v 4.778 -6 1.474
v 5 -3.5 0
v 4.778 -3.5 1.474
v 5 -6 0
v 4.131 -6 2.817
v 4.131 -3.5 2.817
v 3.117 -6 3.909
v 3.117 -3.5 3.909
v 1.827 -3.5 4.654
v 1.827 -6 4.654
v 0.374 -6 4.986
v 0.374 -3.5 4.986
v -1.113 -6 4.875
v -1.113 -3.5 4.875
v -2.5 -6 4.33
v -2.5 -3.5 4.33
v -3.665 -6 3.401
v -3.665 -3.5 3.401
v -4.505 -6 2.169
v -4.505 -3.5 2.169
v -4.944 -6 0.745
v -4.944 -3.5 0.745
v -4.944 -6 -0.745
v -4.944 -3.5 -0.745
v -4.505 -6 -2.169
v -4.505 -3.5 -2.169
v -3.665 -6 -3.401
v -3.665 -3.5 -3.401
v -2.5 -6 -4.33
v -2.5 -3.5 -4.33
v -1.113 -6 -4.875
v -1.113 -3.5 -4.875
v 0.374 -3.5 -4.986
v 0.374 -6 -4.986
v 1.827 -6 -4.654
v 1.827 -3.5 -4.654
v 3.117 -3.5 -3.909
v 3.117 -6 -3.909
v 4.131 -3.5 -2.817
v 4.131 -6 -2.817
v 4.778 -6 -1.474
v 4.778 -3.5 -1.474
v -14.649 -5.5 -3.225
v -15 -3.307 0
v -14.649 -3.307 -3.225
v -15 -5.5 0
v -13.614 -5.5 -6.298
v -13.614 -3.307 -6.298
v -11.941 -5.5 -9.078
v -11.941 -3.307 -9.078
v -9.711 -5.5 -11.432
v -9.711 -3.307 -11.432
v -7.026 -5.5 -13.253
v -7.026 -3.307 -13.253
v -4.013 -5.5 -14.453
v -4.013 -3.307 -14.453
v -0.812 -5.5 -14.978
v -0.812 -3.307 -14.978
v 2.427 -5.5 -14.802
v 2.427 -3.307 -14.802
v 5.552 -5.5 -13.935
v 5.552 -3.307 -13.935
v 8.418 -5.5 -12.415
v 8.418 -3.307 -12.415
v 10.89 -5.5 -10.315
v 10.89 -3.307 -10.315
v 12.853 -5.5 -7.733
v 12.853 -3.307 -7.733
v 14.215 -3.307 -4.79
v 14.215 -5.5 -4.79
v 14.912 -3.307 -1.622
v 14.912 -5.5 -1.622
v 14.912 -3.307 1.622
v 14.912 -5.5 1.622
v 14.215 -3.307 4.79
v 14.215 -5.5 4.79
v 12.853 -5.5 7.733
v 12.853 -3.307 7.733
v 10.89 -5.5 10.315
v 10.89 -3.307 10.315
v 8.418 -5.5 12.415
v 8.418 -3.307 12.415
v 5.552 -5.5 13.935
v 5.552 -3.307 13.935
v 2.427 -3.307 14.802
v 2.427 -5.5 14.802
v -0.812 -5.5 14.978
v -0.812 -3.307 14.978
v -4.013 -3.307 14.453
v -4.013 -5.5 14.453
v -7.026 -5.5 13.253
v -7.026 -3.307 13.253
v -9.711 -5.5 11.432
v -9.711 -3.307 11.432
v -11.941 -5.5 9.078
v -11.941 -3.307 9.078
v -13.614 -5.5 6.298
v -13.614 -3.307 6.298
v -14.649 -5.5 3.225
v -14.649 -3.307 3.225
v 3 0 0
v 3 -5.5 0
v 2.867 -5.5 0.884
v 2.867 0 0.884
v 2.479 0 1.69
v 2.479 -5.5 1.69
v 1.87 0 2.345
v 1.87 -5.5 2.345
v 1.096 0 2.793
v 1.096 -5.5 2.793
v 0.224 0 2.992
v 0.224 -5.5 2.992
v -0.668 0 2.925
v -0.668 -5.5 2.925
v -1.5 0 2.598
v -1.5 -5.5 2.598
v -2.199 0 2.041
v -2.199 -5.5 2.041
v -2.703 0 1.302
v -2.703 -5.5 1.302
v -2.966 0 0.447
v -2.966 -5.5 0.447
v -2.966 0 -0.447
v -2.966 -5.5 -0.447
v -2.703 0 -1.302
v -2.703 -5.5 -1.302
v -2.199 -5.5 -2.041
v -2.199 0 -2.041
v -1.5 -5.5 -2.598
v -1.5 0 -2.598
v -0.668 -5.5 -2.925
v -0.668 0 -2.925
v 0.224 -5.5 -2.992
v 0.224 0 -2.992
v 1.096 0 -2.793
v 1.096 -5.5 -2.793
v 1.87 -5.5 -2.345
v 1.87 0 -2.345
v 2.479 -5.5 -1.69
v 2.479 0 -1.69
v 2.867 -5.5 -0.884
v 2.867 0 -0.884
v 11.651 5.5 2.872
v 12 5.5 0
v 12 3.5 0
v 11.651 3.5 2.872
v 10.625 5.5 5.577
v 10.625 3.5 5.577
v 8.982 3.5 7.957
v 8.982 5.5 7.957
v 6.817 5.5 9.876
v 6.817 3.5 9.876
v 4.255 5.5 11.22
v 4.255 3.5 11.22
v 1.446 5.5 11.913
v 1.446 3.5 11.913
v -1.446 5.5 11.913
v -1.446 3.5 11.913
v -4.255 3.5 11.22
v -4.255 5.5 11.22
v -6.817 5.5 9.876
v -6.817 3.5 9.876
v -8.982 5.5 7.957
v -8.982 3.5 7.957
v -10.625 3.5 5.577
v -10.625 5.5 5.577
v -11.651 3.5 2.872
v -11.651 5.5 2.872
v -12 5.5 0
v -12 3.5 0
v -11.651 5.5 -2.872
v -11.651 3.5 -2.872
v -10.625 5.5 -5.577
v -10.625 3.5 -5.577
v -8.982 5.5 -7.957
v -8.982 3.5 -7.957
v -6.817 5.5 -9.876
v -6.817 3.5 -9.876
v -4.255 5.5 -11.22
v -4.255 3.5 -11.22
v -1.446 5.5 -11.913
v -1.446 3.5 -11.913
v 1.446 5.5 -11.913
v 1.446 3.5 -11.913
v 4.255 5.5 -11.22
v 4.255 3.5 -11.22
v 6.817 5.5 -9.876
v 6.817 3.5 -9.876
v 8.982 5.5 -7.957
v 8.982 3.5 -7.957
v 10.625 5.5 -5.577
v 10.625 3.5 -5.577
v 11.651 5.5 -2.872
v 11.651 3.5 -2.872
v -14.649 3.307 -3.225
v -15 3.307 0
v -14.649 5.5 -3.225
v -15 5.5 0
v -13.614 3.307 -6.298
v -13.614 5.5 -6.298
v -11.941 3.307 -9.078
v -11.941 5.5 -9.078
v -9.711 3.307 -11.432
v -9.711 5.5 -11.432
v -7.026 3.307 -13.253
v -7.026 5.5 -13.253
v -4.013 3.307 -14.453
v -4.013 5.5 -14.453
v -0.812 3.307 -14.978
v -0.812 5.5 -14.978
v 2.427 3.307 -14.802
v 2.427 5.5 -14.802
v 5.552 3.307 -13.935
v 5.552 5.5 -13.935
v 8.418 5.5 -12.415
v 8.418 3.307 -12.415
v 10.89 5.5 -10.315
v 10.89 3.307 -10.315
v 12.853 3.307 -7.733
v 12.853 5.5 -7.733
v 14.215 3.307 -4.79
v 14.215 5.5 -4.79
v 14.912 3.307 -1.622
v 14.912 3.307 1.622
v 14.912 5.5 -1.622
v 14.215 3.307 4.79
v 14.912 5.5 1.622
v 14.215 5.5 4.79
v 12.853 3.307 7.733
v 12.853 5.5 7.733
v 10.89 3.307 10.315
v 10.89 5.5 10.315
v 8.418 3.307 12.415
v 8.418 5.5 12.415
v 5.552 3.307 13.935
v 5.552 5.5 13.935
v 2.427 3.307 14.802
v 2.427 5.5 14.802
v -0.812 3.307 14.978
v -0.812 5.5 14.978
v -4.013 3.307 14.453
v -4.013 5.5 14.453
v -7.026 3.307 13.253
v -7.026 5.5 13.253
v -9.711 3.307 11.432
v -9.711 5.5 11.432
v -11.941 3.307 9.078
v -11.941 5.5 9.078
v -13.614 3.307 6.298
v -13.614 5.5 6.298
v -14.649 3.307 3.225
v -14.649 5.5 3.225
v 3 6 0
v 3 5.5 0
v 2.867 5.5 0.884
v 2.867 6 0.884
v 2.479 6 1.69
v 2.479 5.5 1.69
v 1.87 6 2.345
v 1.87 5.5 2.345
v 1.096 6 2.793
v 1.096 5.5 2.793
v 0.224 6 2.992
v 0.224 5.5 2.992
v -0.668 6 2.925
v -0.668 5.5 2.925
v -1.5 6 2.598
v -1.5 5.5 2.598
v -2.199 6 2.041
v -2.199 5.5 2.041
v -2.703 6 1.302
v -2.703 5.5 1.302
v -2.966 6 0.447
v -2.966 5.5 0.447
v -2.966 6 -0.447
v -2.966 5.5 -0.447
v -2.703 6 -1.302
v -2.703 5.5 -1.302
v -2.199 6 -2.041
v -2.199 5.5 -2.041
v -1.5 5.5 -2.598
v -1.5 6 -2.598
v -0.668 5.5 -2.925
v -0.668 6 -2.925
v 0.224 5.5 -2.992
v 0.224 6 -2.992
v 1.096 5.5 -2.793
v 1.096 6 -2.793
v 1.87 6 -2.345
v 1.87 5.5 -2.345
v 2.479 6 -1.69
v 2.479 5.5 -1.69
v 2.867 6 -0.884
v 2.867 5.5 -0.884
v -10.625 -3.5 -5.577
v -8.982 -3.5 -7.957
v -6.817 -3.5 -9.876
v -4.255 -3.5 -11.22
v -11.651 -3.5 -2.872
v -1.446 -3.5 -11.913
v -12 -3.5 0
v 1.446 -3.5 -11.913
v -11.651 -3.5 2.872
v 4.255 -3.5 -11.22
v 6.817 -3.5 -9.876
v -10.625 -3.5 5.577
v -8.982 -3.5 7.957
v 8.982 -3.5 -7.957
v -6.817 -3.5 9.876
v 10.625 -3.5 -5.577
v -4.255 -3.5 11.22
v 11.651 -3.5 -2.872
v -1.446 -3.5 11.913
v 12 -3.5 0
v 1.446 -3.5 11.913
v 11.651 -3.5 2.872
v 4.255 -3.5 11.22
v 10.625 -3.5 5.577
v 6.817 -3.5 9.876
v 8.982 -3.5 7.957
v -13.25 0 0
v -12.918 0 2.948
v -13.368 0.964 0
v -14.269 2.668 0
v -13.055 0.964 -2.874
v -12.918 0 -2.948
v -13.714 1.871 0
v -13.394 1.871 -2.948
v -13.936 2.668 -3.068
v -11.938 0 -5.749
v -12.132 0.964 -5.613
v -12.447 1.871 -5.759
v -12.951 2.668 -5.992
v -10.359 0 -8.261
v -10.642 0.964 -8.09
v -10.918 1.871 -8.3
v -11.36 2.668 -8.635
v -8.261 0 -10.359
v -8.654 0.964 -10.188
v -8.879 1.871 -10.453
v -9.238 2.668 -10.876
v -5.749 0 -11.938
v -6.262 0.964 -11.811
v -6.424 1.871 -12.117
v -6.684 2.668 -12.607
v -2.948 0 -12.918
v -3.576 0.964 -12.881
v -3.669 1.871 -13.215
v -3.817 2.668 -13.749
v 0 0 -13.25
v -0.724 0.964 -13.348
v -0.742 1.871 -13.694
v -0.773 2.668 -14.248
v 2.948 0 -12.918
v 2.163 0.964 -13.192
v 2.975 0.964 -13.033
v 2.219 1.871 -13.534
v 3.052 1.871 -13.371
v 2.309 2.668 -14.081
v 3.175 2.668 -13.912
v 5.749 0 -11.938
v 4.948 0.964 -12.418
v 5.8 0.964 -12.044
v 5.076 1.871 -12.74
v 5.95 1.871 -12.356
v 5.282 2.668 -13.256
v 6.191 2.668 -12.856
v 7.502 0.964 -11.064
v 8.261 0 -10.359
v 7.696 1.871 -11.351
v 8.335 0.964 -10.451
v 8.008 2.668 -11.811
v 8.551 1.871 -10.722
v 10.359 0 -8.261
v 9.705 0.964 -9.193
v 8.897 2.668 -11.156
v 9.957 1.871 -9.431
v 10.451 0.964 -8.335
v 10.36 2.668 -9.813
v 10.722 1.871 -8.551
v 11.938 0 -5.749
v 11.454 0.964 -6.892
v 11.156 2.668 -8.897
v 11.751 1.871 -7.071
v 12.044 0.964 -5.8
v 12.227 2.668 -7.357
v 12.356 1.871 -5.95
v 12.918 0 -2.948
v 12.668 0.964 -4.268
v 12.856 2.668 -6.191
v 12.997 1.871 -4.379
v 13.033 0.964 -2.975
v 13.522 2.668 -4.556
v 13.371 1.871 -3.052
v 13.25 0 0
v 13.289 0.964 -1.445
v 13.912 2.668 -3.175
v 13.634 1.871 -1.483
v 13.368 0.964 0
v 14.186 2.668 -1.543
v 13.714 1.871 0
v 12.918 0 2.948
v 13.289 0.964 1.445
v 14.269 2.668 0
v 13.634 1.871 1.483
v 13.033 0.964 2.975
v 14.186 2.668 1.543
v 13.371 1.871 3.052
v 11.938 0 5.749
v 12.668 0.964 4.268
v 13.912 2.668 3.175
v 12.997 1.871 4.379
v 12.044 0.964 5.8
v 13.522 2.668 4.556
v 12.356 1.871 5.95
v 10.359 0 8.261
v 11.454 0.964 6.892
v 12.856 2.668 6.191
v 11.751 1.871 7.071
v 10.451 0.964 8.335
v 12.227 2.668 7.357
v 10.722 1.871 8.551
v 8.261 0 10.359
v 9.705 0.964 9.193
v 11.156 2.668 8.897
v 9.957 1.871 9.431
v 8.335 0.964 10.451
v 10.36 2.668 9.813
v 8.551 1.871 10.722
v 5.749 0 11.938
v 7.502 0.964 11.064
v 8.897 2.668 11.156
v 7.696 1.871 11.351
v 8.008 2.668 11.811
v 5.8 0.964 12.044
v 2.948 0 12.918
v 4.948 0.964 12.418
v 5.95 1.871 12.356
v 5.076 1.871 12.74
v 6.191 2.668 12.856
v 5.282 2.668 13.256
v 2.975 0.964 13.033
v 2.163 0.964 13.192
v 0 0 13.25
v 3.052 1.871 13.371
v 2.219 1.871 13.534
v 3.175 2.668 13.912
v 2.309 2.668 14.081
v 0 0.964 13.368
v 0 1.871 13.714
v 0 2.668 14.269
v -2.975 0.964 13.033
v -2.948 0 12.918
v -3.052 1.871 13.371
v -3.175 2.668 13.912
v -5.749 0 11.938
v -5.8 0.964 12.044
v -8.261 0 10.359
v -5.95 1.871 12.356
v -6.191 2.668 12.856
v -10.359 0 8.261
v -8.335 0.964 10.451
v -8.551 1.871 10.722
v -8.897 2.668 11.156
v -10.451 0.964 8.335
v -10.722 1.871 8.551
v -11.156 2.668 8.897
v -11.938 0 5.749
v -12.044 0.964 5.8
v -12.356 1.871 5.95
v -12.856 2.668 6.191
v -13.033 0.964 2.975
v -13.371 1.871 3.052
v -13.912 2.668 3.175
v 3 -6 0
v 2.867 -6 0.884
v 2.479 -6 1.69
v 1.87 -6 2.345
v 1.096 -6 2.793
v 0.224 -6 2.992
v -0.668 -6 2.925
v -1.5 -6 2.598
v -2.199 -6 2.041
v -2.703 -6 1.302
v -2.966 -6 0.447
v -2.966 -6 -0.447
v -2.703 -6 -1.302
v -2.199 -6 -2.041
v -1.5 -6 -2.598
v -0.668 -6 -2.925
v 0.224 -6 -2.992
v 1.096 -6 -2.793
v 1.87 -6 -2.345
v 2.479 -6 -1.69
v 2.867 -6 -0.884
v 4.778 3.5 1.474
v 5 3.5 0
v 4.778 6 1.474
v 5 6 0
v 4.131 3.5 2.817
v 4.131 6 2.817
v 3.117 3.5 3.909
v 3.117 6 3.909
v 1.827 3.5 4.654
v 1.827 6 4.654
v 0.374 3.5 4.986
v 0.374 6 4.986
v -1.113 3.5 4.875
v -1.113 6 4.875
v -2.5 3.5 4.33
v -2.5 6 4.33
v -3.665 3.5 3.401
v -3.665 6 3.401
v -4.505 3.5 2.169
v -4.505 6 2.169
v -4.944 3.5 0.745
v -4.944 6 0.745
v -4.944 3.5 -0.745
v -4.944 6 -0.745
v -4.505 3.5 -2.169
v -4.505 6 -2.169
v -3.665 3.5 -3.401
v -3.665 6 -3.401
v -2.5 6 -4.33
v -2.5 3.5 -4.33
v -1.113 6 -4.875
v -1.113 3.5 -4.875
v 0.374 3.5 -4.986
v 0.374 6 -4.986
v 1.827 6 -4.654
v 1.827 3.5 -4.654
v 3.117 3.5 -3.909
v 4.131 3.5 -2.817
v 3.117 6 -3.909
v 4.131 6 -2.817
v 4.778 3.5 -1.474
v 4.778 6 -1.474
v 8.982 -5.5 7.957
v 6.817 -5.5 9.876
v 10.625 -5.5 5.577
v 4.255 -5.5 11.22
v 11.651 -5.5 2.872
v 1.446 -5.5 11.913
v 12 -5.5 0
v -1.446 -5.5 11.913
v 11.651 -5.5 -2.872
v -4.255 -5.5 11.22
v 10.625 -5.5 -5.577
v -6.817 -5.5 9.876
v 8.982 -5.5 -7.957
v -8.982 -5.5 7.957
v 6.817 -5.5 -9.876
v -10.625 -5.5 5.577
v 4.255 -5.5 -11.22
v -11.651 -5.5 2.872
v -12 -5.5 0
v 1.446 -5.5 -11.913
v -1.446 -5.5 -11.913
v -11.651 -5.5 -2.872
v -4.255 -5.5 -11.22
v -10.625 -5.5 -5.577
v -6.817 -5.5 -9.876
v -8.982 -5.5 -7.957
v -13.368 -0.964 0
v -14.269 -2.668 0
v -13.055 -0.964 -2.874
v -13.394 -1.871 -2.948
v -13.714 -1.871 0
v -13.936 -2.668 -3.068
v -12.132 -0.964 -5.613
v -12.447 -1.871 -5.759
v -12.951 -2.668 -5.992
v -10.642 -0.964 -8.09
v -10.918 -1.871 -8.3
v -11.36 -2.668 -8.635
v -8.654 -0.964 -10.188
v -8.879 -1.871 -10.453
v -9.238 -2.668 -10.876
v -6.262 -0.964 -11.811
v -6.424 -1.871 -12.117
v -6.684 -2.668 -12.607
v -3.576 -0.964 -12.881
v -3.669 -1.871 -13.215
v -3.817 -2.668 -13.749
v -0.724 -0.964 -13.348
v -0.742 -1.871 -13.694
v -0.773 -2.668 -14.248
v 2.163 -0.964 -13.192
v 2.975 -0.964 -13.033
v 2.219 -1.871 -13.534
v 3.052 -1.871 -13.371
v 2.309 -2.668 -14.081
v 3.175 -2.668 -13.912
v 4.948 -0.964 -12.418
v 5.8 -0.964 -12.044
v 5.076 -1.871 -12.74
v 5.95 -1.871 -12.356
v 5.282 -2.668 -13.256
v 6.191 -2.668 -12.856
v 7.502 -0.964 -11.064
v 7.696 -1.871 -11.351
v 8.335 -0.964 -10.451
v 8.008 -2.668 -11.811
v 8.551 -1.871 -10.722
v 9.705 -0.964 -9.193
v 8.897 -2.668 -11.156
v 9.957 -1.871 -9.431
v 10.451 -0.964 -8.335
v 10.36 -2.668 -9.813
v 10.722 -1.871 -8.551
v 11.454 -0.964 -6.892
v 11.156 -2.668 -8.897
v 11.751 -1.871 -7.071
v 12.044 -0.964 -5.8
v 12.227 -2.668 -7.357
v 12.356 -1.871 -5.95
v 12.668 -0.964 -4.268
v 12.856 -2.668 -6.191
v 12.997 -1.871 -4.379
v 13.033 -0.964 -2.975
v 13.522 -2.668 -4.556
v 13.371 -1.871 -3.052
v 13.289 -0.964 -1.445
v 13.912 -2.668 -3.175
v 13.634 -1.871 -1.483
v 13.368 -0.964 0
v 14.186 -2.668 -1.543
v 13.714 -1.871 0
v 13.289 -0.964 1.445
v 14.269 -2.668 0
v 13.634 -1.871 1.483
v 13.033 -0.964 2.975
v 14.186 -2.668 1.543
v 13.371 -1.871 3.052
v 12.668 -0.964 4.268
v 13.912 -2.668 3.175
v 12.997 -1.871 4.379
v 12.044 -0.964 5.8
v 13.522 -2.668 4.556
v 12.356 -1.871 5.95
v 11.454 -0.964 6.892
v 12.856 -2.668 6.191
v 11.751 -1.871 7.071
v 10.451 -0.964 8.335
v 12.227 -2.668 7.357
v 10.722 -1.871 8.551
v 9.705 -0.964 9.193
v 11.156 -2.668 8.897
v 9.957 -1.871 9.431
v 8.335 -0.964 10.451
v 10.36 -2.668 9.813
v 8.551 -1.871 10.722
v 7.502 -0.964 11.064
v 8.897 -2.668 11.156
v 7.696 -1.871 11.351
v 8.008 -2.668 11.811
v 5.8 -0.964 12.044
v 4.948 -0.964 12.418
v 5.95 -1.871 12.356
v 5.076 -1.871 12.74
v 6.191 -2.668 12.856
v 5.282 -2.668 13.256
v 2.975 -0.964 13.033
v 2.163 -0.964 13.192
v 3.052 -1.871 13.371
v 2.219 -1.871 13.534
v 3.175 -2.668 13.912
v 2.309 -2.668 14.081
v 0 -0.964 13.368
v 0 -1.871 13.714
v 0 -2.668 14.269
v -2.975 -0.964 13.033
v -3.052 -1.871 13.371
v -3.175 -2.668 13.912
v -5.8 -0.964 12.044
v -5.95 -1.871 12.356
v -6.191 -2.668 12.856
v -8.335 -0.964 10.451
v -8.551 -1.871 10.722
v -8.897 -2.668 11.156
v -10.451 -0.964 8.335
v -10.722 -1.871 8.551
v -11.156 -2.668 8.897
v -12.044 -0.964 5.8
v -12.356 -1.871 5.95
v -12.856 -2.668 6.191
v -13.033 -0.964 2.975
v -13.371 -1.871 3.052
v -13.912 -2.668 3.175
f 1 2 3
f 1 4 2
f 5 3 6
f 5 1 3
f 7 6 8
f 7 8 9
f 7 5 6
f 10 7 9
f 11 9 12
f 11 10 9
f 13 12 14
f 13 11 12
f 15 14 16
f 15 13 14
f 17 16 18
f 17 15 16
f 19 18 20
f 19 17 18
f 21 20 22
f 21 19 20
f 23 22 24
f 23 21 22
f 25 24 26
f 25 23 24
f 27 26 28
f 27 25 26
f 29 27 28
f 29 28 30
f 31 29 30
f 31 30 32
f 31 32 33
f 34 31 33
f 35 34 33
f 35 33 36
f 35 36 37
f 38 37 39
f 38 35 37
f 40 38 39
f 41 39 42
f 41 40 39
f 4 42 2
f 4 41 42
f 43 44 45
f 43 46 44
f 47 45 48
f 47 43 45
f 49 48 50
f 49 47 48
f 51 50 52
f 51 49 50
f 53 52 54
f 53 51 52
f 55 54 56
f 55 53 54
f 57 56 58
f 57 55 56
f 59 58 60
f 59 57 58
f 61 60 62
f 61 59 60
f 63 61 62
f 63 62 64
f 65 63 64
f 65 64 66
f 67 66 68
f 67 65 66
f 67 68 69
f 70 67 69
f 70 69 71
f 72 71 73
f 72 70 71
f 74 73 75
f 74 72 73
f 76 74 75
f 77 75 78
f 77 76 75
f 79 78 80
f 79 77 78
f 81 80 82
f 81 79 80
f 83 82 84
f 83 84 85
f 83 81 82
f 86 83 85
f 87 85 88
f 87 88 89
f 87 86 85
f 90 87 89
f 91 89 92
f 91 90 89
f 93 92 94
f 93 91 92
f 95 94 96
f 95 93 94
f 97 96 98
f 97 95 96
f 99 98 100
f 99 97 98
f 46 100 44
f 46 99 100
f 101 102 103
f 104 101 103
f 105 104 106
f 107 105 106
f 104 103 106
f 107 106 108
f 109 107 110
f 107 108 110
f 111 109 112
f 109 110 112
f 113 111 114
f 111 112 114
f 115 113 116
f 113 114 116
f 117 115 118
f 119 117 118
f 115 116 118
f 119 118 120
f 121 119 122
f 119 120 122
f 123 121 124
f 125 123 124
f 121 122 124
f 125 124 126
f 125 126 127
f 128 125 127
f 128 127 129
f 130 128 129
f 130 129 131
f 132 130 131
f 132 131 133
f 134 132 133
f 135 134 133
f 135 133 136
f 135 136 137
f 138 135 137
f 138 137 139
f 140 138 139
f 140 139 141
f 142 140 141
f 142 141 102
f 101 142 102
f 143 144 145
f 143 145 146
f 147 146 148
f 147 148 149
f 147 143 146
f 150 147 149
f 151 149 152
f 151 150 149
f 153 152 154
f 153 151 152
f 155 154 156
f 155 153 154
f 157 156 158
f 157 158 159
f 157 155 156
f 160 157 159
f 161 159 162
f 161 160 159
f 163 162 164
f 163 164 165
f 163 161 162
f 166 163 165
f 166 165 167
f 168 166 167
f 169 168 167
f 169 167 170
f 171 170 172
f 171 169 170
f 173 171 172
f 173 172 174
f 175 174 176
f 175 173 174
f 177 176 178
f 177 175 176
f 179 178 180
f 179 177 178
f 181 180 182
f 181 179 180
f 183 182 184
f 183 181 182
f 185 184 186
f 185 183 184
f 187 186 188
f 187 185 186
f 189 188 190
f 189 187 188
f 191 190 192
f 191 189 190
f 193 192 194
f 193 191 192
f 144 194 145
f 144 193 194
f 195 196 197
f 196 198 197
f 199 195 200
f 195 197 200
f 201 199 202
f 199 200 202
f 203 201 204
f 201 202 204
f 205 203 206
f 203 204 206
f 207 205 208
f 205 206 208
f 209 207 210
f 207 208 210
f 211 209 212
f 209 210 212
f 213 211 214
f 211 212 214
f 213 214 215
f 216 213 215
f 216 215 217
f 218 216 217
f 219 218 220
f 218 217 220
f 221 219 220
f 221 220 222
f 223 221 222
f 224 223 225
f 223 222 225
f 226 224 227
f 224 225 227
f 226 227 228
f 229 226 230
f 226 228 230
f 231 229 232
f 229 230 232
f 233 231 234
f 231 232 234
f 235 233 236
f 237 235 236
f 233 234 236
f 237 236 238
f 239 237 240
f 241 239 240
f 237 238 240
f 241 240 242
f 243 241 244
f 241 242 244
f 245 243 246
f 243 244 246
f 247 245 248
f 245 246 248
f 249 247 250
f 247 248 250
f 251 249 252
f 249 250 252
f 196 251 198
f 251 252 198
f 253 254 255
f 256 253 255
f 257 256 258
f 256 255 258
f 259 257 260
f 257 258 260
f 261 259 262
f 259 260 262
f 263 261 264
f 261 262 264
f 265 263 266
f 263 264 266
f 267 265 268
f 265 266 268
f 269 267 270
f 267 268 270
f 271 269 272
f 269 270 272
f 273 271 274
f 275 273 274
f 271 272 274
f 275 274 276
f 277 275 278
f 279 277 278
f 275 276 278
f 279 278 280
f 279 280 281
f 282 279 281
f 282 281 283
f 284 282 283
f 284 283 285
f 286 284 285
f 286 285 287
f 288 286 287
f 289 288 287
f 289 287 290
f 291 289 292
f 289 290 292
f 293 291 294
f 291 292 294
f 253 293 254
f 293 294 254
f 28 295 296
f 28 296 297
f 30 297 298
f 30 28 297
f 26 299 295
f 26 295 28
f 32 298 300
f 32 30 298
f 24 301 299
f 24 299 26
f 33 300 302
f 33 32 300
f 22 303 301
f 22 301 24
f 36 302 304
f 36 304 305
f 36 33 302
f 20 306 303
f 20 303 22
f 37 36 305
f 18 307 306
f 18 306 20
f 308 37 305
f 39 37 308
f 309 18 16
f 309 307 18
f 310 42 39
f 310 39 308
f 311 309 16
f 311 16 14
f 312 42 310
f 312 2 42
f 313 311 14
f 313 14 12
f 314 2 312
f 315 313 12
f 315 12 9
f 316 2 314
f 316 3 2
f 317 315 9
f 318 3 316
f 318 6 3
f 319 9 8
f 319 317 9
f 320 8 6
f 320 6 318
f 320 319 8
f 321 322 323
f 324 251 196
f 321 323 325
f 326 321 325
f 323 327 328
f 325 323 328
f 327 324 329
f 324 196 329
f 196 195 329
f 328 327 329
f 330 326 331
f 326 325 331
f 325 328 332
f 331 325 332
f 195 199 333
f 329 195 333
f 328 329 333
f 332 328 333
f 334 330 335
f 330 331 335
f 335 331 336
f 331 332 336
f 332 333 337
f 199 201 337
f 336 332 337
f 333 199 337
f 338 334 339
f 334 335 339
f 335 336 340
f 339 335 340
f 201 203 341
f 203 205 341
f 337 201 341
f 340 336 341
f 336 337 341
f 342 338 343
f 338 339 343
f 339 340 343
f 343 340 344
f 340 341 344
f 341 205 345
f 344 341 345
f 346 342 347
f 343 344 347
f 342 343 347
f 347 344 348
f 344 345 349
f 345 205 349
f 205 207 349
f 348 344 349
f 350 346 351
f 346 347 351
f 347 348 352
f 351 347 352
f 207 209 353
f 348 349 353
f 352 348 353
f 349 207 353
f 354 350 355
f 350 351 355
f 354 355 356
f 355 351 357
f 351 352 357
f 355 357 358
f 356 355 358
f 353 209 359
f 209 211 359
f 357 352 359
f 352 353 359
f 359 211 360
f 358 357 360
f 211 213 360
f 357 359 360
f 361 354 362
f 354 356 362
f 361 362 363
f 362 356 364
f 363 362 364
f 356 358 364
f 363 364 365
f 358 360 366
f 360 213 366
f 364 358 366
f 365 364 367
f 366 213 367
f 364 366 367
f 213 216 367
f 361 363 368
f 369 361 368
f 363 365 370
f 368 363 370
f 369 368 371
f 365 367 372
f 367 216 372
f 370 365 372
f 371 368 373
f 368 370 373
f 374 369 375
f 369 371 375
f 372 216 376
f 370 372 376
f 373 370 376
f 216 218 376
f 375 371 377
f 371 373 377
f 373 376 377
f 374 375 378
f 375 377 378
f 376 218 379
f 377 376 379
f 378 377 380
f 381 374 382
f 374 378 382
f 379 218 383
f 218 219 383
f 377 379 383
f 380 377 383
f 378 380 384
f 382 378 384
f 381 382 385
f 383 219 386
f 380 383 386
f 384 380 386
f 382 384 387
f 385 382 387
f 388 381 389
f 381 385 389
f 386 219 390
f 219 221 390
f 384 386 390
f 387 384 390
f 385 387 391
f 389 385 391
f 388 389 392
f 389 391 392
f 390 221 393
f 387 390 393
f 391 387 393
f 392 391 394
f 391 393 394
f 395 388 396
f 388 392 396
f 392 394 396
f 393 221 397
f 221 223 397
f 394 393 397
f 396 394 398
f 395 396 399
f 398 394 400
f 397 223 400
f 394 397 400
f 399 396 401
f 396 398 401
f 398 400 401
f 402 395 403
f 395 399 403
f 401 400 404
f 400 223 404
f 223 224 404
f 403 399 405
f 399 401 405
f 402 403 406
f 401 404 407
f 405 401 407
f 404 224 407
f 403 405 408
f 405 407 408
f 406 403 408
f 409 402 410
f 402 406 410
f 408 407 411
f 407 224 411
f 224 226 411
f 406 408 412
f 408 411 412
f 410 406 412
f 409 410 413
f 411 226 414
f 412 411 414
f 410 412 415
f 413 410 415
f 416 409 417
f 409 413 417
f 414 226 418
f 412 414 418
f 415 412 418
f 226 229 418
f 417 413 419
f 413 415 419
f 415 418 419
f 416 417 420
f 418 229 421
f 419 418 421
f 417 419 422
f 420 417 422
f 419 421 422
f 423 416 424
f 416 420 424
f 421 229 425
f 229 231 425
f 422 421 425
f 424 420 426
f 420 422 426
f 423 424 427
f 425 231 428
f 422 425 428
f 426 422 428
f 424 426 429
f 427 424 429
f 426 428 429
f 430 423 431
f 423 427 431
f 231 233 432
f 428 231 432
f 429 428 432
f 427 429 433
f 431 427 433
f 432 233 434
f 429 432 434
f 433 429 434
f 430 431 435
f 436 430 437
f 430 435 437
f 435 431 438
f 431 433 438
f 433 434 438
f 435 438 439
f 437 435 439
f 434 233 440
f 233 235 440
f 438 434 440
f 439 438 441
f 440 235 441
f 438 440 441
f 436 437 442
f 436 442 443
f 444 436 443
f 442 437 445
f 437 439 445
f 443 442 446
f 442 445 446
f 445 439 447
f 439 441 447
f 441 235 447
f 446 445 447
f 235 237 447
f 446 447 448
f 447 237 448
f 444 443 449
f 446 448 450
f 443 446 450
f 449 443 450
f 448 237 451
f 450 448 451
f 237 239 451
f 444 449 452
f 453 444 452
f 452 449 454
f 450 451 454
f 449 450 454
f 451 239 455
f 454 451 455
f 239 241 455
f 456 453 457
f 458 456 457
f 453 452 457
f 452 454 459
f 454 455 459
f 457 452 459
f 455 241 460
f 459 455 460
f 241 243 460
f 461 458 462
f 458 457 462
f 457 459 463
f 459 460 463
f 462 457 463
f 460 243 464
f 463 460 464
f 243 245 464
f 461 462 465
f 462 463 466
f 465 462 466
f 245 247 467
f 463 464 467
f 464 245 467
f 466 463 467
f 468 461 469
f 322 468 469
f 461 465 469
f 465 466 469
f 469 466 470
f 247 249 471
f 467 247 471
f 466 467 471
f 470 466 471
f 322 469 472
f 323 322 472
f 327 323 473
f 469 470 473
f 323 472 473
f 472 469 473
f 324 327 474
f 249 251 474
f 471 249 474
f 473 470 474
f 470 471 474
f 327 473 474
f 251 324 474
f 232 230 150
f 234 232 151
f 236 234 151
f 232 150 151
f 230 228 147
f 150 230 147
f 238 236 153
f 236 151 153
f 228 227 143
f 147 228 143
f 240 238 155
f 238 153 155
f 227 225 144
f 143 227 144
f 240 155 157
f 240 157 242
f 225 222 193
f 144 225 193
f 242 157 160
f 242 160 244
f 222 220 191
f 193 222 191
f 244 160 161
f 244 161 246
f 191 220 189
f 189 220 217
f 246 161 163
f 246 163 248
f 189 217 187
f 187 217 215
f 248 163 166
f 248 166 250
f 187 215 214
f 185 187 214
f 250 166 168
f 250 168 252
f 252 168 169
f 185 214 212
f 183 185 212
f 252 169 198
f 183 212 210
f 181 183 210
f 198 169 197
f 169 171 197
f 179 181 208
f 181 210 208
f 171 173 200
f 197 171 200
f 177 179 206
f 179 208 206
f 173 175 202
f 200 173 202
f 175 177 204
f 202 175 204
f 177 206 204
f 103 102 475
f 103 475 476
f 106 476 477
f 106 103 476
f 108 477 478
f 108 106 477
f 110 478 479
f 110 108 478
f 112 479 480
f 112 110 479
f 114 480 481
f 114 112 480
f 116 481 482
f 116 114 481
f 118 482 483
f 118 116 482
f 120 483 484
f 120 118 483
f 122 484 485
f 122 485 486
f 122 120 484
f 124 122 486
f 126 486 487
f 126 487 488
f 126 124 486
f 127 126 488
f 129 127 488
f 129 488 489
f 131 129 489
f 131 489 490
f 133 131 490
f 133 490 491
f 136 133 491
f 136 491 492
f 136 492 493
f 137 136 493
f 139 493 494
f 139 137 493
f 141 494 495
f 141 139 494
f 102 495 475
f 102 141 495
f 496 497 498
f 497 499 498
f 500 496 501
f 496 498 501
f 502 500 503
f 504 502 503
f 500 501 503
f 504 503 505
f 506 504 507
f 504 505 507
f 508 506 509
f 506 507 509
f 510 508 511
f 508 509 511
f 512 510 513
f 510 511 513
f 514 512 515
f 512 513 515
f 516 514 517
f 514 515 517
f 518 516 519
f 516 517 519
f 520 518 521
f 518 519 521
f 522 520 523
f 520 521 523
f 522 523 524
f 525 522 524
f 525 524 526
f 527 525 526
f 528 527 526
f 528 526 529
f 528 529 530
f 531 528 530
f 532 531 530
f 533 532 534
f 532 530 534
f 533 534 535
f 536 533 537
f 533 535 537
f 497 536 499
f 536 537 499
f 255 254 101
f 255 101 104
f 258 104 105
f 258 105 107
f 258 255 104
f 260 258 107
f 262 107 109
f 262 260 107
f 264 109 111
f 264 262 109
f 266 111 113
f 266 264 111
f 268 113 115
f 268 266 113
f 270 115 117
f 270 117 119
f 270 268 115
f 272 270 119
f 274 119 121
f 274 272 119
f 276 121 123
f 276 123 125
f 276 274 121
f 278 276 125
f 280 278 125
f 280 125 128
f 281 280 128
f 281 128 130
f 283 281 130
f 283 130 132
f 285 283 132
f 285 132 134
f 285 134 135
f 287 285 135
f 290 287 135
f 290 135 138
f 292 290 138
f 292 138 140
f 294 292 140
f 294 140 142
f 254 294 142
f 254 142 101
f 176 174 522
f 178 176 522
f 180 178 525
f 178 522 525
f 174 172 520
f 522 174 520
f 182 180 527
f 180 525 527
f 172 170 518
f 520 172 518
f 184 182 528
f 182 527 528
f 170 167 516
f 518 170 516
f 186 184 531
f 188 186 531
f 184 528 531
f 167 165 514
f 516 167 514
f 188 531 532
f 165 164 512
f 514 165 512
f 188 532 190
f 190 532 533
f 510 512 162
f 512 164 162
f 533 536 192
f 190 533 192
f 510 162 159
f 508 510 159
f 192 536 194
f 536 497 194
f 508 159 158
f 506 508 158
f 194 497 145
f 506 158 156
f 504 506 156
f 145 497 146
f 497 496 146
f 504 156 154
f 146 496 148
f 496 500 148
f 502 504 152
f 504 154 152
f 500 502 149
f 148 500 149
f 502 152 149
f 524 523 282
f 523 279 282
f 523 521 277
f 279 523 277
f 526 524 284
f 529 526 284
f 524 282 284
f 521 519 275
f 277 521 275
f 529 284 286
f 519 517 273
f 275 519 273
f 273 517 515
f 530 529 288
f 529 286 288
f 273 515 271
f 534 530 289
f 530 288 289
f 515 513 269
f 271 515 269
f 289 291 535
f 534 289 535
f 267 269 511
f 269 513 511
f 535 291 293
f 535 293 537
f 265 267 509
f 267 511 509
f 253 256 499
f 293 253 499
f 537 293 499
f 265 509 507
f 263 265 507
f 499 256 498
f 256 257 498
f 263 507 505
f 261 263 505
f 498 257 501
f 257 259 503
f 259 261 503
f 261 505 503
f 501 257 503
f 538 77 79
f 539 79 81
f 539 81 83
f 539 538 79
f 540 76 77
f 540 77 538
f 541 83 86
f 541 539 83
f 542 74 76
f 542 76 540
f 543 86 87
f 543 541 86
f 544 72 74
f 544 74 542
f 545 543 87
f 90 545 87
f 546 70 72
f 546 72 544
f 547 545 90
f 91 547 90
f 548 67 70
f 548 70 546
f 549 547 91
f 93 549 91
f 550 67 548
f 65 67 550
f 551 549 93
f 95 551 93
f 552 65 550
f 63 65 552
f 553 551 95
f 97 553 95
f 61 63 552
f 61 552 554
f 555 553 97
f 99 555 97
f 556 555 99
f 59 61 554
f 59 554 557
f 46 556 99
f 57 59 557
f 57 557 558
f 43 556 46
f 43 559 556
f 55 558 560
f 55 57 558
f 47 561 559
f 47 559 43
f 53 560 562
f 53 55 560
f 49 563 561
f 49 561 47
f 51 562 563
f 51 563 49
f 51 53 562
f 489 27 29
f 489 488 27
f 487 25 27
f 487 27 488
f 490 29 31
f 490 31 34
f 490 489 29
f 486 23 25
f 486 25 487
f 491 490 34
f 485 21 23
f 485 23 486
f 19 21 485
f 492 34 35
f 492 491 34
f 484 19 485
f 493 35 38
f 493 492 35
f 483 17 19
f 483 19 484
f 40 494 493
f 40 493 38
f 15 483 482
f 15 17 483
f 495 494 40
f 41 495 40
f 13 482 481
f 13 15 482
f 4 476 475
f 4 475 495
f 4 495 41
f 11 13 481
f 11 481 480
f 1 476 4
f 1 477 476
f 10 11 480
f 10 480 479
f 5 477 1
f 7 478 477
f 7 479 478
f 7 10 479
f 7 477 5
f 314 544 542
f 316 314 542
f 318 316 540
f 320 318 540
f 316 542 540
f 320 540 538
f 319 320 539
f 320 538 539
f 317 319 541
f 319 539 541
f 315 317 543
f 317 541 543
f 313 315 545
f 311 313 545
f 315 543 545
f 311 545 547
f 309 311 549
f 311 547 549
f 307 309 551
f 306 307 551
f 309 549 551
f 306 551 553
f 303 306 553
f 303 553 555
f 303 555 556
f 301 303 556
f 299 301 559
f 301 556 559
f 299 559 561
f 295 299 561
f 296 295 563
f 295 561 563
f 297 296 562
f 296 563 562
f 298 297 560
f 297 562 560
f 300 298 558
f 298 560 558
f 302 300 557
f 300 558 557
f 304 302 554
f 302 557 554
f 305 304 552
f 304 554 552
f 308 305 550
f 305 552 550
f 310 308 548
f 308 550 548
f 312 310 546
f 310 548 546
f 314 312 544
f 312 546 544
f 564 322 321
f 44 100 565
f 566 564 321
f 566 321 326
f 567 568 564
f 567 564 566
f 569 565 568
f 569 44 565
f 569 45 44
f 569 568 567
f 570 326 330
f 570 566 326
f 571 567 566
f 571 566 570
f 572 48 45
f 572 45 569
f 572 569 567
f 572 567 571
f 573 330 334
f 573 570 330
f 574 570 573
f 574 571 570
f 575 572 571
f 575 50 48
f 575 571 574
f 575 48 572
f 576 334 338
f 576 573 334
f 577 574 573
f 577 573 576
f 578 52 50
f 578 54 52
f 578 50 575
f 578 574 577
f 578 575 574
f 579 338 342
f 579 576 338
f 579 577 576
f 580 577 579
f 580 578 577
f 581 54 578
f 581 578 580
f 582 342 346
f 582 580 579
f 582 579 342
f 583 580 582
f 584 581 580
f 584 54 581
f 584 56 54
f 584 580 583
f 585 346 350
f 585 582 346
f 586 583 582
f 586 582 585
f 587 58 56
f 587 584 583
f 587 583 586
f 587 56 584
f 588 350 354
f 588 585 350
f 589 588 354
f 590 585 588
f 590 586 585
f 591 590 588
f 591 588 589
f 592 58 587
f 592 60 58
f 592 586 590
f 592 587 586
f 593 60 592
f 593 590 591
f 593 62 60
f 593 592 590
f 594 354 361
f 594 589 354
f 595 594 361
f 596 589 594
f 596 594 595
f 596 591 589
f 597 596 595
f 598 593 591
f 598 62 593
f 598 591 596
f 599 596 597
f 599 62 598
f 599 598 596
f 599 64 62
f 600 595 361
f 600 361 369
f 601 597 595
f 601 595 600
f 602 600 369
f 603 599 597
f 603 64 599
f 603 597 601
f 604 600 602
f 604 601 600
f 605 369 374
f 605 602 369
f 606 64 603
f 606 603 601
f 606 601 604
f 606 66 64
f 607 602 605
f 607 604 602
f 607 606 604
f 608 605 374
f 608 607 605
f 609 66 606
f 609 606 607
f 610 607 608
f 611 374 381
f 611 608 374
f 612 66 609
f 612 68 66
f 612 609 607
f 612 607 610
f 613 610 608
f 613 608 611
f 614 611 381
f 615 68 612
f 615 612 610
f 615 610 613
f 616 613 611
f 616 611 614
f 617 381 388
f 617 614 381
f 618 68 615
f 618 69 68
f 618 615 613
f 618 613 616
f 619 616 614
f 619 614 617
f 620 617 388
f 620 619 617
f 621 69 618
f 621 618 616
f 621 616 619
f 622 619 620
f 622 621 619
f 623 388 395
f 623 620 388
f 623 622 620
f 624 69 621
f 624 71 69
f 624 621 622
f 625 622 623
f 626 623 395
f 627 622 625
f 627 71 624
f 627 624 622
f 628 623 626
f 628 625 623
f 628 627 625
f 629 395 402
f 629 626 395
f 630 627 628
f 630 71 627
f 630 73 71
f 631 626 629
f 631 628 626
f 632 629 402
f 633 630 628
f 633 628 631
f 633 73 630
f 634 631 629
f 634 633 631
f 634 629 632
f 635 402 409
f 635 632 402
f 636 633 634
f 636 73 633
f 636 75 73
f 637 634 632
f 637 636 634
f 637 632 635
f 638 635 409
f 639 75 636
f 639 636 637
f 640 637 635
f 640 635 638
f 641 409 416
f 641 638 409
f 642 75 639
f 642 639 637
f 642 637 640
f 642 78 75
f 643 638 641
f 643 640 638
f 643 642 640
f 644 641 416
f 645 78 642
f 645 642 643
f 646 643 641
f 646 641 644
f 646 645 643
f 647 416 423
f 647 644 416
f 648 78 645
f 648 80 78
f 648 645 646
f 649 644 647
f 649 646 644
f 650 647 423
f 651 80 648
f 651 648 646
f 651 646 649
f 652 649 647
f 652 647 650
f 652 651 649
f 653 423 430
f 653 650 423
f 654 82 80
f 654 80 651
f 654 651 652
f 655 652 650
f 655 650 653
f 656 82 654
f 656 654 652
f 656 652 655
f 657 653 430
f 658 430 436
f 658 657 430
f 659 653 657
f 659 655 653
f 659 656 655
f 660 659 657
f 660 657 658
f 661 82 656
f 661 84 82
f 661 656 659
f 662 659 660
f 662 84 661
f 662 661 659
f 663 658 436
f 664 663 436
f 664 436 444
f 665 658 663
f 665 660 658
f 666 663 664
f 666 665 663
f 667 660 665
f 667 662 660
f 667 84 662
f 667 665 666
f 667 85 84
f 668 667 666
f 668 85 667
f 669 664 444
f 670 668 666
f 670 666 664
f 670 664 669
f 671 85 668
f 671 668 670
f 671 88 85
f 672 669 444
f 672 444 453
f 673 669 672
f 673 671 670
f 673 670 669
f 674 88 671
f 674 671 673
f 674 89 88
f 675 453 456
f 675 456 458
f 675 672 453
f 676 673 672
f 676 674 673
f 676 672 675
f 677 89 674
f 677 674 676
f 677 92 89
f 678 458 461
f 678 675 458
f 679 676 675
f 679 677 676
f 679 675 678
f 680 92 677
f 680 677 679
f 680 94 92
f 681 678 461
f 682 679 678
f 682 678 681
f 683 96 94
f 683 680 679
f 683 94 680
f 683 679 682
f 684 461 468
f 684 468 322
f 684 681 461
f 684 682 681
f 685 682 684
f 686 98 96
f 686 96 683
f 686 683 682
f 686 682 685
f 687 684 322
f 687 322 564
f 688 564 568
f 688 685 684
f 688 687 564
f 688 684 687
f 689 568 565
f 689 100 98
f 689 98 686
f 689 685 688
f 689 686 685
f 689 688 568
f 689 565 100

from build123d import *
from build123d import SkipClean  # not in build123d's __all__

# Parameters (mm, degrees)
F2_R     = 5
F2_R_2   = 3
F3_DEPTH = 0.5
F2_R_3   = 12
F4_DEPTH = 2
F5_DEPTH = 25


with BuildPart() as f1:
    # F0 (on Top) → F1 (revolve)
    with BuildSketch(Plane.XY):
        with BuildLine():
            Line((0, -5.5), (0, 0))
            Line((0, 0), (-13.25, 0))
            ThreePointArc((-13.25, 0), (-13.7144660941, -1.8708286934), (-15, -3.3071891388))
            Line((-15, -3.3071891388), (-15, -5.5))
            Line((-15, -5.5), (0, -5.5))
        make_face()
    revolve(axis=Axis((0, -2.75, 0), (0, -1, 0)))

    # F2 (on face) → F3 (join)
    with BuildSketch(Plane.XZ.offset(5.5)):
        Circle(F2_R)
        Circle(F2_R_2, mode=Mode.SUBTRACT)
    extrude(amount=F3_DEPTH)

    # F2 (on face) → F4 (cut)
    with BuildSketch(Plane.XZ.offset(5.5)):
        Circle(F2_R_3)
        Circle(F2_R, mode=Mode.SUBTRACT)
    extrude(amount=-F4_DEPTH, mode=Mode.SUBTRACT)

    # F5 (cut): a face of the model
    f5_faces = [f1.faces().sort_by_distance(p)[0] for p in [
        (0, -5.5, 0),
    ]]
    extrude(f5_faces, amount=-F5_DEPTH, mode=Mode.SUBTRACT)

    # F6: F1 across plane


with BuildPart() as f1_1:
    add(f1.part, clean=False)
    with SkipClean():  # cleaning this boolean's faces spoils the solid; the shape is the same uncleaned
        add(f1.part.mirror(Plane.XZ), clean=False)


solid = f1_1.part
